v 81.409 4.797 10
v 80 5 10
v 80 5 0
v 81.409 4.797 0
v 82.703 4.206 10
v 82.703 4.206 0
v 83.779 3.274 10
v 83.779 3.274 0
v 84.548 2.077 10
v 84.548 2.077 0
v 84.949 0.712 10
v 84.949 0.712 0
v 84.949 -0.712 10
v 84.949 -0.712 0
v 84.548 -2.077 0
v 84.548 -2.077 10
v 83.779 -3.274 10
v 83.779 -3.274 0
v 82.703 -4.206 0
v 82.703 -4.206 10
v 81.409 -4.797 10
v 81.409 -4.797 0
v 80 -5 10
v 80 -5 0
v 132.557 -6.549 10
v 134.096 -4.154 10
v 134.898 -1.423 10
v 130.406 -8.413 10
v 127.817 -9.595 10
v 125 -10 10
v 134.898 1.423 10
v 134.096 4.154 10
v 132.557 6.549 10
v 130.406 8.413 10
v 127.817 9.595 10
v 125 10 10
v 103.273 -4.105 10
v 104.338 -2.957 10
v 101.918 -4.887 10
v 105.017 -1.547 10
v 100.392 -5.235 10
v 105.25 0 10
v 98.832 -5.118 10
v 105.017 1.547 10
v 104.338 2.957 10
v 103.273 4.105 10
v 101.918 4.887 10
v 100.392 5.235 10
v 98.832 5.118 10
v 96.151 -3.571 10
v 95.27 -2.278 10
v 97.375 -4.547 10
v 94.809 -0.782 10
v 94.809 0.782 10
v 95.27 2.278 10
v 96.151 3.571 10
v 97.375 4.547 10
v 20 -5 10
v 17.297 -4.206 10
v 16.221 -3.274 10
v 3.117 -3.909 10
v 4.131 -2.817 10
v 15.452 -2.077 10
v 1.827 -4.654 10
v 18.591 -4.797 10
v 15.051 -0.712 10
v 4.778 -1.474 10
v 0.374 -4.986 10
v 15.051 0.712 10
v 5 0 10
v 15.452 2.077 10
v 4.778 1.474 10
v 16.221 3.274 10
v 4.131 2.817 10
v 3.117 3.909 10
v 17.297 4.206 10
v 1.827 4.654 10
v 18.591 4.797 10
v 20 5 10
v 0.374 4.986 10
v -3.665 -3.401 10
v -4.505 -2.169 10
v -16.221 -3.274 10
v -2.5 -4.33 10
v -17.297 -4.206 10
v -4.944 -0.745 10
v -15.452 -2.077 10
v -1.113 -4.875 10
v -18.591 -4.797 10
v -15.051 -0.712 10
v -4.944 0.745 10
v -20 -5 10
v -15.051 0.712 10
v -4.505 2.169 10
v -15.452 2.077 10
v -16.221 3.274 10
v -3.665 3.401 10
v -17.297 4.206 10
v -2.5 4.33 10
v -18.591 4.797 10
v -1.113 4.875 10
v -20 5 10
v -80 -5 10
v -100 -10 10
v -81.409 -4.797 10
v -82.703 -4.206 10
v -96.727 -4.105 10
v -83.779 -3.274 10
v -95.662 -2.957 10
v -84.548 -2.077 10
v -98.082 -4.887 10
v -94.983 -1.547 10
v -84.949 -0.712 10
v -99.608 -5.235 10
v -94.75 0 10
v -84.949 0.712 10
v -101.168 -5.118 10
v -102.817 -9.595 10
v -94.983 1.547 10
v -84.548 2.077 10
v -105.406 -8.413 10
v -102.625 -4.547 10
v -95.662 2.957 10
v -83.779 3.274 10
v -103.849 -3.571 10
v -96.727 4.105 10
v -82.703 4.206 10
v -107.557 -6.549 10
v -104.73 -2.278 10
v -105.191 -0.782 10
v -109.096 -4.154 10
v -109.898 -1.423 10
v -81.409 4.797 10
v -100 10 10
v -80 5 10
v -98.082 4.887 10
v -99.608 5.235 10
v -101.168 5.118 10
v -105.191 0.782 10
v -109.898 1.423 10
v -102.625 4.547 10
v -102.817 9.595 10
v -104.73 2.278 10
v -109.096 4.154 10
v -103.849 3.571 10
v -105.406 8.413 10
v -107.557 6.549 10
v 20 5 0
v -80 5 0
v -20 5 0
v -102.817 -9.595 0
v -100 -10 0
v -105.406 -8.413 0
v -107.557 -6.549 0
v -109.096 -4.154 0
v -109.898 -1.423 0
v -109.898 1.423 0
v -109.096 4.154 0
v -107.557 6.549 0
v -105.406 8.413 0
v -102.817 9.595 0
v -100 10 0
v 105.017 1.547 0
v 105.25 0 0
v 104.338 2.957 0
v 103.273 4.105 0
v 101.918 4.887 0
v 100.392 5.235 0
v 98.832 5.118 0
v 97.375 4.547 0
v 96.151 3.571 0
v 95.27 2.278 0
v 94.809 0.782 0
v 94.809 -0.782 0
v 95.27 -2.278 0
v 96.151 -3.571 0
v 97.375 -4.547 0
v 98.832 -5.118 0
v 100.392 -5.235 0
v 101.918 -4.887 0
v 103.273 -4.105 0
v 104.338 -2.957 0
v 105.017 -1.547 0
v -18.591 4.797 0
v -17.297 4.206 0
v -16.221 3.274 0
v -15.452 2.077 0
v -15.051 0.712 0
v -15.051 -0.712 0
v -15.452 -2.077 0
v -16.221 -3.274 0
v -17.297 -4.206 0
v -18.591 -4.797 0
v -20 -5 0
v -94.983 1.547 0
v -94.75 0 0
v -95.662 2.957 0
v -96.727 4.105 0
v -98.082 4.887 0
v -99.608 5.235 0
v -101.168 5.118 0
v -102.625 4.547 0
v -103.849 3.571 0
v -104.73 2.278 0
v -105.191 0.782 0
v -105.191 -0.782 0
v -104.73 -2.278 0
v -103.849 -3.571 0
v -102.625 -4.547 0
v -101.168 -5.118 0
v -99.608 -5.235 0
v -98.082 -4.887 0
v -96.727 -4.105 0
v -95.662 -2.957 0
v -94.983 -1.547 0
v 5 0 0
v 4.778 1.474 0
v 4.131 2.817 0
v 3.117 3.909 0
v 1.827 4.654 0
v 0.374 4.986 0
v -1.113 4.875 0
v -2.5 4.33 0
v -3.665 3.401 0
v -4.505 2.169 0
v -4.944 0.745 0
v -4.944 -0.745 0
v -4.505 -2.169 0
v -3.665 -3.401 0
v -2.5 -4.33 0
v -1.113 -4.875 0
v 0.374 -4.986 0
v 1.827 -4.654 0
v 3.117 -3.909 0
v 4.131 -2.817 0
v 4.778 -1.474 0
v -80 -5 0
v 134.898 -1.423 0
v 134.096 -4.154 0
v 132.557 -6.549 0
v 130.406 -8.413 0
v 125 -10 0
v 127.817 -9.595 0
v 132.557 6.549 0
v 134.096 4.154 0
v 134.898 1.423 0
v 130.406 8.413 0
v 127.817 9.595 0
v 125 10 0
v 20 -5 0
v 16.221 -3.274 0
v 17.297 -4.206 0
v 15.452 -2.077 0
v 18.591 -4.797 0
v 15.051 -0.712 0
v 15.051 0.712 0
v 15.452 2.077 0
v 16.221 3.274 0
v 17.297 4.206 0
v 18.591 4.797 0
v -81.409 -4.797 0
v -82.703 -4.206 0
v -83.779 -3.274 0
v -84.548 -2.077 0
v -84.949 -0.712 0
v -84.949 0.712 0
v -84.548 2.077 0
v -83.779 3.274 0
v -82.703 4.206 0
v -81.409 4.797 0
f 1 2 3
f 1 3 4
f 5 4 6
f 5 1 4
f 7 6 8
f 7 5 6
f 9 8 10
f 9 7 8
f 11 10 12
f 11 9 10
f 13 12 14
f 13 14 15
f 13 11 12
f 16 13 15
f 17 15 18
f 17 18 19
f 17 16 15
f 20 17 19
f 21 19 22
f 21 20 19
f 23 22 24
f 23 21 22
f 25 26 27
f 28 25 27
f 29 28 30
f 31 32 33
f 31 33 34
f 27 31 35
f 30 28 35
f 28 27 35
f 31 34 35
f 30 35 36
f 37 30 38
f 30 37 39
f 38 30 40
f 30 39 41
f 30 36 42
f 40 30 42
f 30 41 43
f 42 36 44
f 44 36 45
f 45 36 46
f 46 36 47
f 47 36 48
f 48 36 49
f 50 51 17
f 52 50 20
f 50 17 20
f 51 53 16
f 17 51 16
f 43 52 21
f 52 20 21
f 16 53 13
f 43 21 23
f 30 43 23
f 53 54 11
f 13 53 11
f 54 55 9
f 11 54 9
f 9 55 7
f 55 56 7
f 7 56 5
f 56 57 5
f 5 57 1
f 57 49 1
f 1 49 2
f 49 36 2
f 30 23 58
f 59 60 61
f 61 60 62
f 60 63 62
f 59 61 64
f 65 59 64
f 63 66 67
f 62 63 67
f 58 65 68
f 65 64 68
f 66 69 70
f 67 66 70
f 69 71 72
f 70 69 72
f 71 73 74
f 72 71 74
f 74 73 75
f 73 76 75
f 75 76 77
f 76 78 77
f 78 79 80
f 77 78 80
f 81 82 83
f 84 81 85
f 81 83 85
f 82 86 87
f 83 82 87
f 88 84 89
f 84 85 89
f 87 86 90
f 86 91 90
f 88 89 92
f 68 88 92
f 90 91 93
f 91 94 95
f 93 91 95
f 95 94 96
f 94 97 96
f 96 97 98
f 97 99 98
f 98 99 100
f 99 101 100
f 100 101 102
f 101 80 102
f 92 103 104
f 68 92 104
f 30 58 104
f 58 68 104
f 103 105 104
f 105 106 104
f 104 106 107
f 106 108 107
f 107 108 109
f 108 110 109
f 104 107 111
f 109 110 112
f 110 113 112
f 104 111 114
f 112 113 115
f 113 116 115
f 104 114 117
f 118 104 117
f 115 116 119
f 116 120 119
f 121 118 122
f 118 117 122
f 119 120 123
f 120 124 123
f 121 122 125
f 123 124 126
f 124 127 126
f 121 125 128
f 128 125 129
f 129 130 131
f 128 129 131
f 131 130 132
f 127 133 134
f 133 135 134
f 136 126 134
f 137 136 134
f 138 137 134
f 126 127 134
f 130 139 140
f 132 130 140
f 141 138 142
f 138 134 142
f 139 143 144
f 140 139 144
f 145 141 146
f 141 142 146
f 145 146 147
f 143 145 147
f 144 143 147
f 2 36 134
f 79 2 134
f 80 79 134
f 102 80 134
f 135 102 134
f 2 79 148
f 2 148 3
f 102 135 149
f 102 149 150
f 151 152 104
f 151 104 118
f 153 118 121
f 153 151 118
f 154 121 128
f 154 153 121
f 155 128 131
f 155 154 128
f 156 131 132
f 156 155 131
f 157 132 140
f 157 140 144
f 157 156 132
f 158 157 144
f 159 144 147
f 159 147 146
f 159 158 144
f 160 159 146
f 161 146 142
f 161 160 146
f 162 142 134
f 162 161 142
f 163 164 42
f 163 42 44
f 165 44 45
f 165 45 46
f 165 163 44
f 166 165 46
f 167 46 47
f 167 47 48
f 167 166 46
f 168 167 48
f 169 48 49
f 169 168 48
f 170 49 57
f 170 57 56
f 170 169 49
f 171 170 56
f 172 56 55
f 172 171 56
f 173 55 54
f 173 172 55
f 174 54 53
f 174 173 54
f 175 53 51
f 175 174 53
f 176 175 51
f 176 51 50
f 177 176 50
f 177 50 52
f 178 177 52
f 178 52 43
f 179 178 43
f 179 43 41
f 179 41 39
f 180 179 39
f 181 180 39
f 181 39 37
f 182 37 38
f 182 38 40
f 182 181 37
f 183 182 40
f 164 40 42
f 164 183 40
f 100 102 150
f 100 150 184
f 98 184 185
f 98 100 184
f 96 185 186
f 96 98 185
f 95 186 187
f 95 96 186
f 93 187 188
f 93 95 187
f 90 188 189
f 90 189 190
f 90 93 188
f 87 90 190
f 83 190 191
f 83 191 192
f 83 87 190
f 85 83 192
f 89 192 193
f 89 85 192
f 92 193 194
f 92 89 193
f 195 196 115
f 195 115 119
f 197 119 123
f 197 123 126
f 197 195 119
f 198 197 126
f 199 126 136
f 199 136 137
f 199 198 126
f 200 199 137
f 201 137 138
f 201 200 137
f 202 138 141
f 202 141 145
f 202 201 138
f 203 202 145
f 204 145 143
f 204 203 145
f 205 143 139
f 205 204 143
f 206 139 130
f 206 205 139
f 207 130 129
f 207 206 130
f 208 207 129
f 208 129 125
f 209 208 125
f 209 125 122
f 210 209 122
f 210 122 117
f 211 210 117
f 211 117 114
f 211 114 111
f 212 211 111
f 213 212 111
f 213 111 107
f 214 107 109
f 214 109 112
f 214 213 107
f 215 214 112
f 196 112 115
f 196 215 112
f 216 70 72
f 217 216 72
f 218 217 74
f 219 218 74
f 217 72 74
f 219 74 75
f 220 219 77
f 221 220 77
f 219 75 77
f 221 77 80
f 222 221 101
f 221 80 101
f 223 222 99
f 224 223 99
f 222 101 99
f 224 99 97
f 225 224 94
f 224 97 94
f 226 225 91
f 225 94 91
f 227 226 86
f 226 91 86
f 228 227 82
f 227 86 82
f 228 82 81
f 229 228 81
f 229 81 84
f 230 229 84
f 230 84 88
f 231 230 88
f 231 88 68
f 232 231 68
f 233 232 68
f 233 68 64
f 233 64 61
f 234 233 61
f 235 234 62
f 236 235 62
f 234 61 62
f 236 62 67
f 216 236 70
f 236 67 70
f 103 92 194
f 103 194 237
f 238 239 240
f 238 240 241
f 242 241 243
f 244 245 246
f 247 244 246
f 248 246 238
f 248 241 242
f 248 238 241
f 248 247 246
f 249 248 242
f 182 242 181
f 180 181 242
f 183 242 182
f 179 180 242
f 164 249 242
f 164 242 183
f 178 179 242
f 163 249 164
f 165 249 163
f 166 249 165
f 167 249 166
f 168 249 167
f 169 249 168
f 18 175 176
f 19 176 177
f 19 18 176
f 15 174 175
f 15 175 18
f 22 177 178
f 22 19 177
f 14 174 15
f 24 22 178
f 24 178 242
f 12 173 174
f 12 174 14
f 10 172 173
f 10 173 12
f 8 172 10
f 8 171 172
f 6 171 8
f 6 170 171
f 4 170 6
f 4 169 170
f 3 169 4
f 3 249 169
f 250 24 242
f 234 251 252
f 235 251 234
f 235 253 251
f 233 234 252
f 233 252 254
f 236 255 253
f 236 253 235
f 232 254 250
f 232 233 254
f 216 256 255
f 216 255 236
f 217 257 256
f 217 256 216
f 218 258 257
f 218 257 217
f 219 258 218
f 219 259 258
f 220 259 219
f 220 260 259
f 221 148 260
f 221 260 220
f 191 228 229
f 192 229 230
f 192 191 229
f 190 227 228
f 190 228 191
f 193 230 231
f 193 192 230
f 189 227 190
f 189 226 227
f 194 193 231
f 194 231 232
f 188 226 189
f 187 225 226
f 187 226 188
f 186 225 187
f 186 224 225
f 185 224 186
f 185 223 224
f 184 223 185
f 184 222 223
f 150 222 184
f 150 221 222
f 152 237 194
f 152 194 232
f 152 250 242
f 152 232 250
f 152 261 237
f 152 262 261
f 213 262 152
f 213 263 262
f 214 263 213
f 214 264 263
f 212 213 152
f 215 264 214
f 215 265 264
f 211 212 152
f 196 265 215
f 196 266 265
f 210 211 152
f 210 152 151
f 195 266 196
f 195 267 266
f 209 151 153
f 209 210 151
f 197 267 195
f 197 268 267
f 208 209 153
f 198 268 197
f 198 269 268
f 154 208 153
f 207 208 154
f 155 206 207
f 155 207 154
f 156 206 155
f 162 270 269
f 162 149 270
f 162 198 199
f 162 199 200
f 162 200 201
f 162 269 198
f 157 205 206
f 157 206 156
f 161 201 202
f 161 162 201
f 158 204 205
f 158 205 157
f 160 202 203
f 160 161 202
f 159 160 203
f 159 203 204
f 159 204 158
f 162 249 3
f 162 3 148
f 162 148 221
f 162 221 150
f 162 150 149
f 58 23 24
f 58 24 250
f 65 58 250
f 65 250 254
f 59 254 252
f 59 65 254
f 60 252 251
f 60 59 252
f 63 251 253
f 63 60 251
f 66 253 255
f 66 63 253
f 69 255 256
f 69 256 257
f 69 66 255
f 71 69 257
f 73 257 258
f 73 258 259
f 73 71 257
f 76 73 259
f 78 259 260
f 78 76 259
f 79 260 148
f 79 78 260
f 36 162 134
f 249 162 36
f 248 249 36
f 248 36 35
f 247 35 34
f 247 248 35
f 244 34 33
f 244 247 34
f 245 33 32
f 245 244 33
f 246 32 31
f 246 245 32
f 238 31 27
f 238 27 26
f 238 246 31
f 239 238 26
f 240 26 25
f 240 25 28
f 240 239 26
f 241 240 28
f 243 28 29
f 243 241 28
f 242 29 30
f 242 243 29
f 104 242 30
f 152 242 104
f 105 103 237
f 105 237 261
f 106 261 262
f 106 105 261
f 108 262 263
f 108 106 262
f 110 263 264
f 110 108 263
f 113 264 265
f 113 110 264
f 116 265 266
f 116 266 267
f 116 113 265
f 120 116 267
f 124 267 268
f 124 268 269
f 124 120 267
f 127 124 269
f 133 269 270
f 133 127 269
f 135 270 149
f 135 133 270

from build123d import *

# Parameters (mm, degrees)
SKETCH_1_R          = 5.25
EXTRUDE_1_DEPTH     = 10
SKETCH_2_R          = 5
CUT_EXTRUDE_1_DEPTH = 10
CUT_EXTRUDE_2_DEPTH = 10


with BuildPart() as part:
    # 草图1 → 凸台-拉伸1 (new body)
    with BuildSketch(Plane.XY):
        with BuildLine():
            Line((-100, 10), (100, 10))
            Line((100, 10), (125, 10))
            ThreePointArc((125, 10), (135, 0), (125, -10))
            Line((125, -10), (100, -10))
            Line((100, -10), (-100, -10))
            ThreePointArc((-100, -10), (-110, 0), (-100, 10))
        make_face()
        with Locations((-100, 0)):
            Circle(SKETCH_1_R, mode=Mode.SUBTRACT)
        with Locations((100, 0)):
            Circle(SKETCH_1_R, mode=Mode.SUBTRACT)
    extrude(amount=EXTRUDE_1_DEPTH)

    # 草图2 → 切除-拉伸1 (cut)
    with BuildSketch(Plane.XY.offset(10)):
        Circle(SKETCH_2_R)
    extrude(amount=-CUT_EXTRUDE_1_DEPTH, mode=Mode.SUBTRACT)

    # 草图4 → 切除-拉伸2 (cut)
    with BuildSketch(Plane.XY.offset(10)):
        with BuildLine():
            Line((-80, 5), (-20, 5))
            ThreePointArc((-20, 5), (-15, 0), (-20, -5))
            Line((-20, -5), (-80, -5))
            ThreePointArc((-80, -5), (-85, 0), (-80, 5))
        make_face()
        with BuildLine():
            Line((20, 5), (80, 5))
            ThreePointArc((80, 5), (85, 0), (80, -5))
            Line((80, -5), (20, -5))
            ThreePointArc((20, -5), (15, 0), (20, 5))
        make_face()
    extrude(amount=-CUT_EXTRUDE_2_DEPTH, mode=Mode.SUBTRACT)


solid = part.part
